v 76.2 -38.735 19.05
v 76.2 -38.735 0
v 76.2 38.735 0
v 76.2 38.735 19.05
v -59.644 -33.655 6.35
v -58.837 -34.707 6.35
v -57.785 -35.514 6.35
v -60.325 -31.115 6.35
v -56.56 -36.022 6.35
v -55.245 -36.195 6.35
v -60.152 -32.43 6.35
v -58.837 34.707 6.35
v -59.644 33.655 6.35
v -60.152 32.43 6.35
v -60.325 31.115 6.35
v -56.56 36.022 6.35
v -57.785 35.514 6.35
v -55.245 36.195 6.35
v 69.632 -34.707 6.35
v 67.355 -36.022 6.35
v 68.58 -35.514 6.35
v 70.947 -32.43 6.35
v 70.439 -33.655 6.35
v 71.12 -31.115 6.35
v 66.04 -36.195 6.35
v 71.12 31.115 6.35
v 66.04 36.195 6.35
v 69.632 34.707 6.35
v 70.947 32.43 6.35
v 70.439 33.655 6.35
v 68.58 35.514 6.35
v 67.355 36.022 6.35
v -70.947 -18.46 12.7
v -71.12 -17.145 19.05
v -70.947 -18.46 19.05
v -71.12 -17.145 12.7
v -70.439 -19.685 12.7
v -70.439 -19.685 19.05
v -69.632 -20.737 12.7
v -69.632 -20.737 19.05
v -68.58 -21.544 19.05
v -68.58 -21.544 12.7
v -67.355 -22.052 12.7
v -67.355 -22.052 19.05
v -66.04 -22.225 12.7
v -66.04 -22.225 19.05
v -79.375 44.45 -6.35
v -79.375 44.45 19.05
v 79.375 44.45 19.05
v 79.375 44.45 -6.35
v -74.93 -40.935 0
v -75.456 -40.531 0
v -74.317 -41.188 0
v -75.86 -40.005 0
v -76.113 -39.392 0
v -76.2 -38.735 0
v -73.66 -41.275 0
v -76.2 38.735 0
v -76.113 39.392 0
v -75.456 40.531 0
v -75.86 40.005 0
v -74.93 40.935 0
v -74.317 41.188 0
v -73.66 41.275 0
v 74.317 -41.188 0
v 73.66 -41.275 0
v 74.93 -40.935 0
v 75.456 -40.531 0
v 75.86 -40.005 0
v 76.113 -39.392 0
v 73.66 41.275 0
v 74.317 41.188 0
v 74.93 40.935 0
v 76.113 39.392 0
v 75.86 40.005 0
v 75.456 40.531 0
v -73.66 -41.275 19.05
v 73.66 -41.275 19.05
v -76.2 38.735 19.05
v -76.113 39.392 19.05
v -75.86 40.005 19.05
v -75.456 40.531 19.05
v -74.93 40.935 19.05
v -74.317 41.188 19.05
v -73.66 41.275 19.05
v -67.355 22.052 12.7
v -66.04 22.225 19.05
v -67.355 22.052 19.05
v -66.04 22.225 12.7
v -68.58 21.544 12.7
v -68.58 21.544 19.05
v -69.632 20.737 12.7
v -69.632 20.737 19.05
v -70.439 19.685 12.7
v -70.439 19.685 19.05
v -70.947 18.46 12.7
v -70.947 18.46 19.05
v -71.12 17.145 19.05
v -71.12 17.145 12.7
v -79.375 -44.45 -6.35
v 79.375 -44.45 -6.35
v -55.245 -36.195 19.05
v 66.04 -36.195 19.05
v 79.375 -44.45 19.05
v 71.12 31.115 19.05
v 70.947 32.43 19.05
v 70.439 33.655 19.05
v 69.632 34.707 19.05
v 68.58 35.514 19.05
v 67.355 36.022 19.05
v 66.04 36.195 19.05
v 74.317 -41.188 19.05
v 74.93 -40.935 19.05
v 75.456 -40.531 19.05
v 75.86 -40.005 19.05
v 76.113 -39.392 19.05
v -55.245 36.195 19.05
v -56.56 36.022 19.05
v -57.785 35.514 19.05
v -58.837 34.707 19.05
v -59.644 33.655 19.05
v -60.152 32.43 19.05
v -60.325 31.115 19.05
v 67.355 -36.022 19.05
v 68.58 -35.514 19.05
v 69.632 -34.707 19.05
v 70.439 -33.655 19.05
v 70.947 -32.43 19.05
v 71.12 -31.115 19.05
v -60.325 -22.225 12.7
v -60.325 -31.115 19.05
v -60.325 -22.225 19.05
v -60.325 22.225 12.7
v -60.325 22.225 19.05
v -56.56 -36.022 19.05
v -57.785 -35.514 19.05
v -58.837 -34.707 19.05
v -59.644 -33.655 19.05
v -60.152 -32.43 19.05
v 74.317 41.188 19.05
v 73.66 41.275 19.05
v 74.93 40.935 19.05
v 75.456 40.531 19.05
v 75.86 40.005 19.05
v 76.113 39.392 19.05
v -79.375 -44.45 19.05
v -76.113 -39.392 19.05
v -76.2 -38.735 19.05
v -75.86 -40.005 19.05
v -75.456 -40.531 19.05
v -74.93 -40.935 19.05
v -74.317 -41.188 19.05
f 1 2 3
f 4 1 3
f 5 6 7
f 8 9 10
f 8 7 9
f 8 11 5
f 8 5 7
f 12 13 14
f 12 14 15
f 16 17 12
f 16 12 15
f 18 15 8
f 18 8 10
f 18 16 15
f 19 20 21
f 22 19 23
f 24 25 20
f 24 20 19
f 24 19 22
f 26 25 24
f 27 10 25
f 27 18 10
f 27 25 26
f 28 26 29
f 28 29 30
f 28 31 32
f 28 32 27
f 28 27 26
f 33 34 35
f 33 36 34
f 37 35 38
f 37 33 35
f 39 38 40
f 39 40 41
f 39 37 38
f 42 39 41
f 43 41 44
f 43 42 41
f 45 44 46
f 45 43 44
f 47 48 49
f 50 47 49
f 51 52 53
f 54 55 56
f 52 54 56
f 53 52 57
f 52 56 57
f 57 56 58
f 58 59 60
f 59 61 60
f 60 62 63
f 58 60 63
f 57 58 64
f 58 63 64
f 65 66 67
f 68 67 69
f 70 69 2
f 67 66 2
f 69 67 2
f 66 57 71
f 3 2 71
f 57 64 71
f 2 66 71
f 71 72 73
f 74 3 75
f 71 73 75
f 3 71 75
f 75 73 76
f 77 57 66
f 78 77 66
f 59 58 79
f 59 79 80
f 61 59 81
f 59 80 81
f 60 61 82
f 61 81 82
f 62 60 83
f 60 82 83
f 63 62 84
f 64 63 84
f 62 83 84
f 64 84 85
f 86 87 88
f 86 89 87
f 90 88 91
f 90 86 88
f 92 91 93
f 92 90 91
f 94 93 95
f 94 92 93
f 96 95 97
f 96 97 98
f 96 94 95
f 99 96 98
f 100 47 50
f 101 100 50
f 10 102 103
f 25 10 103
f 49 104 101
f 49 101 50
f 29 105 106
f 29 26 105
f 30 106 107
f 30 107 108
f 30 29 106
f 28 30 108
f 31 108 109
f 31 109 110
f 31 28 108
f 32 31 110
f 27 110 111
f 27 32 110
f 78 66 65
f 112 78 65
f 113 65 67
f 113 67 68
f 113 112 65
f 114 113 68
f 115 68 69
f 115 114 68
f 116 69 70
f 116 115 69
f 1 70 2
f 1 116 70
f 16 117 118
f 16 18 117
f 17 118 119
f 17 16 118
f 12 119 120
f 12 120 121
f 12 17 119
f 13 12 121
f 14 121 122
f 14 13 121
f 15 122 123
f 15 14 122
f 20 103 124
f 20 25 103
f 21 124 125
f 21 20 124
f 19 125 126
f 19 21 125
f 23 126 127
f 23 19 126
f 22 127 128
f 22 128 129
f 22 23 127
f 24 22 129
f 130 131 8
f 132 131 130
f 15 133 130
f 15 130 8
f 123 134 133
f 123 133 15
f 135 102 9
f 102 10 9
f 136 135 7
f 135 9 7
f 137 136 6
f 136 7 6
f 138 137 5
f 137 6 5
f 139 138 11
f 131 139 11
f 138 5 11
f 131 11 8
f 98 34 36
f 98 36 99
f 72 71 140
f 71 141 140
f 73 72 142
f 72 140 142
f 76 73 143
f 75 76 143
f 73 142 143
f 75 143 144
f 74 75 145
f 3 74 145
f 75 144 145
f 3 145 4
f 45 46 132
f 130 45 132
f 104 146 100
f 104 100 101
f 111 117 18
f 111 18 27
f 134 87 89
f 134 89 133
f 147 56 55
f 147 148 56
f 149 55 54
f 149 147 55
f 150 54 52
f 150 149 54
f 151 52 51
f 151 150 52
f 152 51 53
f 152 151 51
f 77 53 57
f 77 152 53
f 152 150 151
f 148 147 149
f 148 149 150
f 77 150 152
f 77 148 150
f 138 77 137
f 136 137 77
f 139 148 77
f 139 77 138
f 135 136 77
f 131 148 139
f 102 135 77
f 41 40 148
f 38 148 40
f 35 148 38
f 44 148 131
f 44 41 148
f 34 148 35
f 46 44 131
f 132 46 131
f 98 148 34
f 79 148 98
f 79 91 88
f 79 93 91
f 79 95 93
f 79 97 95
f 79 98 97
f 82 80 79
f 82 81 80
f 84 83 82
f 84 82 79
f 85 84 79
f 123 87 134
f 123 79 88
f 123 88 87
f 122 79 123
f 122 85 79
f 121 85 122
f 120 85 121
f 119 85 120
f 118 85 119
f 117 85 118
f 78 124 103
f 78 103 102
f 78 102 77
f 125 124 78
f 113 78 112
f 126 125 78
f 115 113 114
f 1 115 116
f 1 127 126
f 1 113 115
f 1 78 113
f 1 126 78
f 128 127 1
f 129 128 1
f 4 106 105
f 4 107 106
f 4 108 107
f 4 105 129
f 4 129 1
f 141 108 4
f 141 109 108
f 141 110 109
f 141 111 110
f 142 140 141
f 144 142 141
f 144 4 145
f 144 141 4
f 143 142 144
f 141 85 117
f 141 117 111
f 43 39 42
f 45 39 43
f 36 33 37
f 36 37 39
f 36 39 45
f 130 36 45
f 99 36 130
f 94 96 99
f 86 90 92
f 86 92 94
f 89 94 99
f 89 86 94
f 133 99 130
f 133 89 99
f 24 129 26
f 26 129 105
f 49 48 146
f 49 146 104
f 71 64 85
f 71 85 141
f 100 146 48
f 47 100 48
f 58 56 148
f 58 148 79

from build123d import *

# Parameters (mm, degrees)
SKETCH1_W      = 152.4
SKETCH1_H      = 82.55
EXTRUDE1_DEPTH = 19.05
SKETCH2_W      = 131.445
SKETCH2_H      = 72.39
EXTRUDE2_DEPTH = 12.7
FILLET1_R      = 2.54
FILLET2_R      = 5.08
SKETCH3_W      = 10.795
SKETCH3_H      = 44.45
EXTRUDE3_DEPTH = 6.35
FILLET3_R      = 5.08
SKETCH4_W      = 158.75
SKETCH4_H      = 88.9
STOCK_DEPTH    = 25.4


with BuildPart() as part:
    # Sketch1 → Extrude1 (new body)
    with BuildSketch(Plane.XY):
        Rectangle(SKETCH1_W, SKETCH1_H)
    extrude(amount=EXTRUDE1_DEPTH)

    # Sketch2 → Extrude2 (cut)
    with BuildSketch(Plane.XY.offset(19.05)):
        with Locations((5.3975, 0)):
            Rectangle(SKETCH2_W, SKETCH2_H)
    extrude(amount=-EXTRUDE2_DEPTH, mode=Mode.SUBTRACT)

    # Fillet1
    fillet1_edges = [part.edges().sort_by_distance(p)[0] for p in [
        (76.2, -41.275, 9.525),
        (-76.2, -41.275, 9.525),
        (-76.2, 41.275, 9.525),
        (76.2, 41.275, 9.525),
    ]]
    fillet(fillet1_edges, radius=FILLET1_R)

    # Fillet2
    fillet2_edges = [part.edges().sort_by_distance(p)[0] for p in [
        (71.12, 36.195, 12.7),
        (71.12, -36.195, 12.7),
        (-60.325, -36.195, 12.7),
        (-60.325, 36.195, 12.7),
    ]]
    fillet(fillet2_edges, radius=FILLET2_R)

    # Sketch3 → Extrude3 (cut)
    with BuildSketch(Plane.XY.offset(19.05)):
        with Locations((-65.7225, 0)):
            Rectangle(SKETCH3_W, SKETCH3_H)
    extrude(amount=-EXTRUDE3_DEPTH, mode=Mode.SUBTRACT)

    # Fillet3
    fillet3_edges = [part.edges().sort_by_distance(p)[0] for p in [
        (-71.12, -22.225, 15.875),
        (-71.12, 22.225, 15.875),
    ]]
    fillet(fillet3_edges, radius=FILLET3_R)


with BuildPart() as body_2:
    # Sketch4 → Stock (new body)
    with BuildSketch(Plane.XY.offset(19.05)):
        Rectangle(SKETCH4_W, SKETCH4_H)
    extrude(amount=-STOCK_DEPTH)


solid = Compound([part.part, body_2.part])
